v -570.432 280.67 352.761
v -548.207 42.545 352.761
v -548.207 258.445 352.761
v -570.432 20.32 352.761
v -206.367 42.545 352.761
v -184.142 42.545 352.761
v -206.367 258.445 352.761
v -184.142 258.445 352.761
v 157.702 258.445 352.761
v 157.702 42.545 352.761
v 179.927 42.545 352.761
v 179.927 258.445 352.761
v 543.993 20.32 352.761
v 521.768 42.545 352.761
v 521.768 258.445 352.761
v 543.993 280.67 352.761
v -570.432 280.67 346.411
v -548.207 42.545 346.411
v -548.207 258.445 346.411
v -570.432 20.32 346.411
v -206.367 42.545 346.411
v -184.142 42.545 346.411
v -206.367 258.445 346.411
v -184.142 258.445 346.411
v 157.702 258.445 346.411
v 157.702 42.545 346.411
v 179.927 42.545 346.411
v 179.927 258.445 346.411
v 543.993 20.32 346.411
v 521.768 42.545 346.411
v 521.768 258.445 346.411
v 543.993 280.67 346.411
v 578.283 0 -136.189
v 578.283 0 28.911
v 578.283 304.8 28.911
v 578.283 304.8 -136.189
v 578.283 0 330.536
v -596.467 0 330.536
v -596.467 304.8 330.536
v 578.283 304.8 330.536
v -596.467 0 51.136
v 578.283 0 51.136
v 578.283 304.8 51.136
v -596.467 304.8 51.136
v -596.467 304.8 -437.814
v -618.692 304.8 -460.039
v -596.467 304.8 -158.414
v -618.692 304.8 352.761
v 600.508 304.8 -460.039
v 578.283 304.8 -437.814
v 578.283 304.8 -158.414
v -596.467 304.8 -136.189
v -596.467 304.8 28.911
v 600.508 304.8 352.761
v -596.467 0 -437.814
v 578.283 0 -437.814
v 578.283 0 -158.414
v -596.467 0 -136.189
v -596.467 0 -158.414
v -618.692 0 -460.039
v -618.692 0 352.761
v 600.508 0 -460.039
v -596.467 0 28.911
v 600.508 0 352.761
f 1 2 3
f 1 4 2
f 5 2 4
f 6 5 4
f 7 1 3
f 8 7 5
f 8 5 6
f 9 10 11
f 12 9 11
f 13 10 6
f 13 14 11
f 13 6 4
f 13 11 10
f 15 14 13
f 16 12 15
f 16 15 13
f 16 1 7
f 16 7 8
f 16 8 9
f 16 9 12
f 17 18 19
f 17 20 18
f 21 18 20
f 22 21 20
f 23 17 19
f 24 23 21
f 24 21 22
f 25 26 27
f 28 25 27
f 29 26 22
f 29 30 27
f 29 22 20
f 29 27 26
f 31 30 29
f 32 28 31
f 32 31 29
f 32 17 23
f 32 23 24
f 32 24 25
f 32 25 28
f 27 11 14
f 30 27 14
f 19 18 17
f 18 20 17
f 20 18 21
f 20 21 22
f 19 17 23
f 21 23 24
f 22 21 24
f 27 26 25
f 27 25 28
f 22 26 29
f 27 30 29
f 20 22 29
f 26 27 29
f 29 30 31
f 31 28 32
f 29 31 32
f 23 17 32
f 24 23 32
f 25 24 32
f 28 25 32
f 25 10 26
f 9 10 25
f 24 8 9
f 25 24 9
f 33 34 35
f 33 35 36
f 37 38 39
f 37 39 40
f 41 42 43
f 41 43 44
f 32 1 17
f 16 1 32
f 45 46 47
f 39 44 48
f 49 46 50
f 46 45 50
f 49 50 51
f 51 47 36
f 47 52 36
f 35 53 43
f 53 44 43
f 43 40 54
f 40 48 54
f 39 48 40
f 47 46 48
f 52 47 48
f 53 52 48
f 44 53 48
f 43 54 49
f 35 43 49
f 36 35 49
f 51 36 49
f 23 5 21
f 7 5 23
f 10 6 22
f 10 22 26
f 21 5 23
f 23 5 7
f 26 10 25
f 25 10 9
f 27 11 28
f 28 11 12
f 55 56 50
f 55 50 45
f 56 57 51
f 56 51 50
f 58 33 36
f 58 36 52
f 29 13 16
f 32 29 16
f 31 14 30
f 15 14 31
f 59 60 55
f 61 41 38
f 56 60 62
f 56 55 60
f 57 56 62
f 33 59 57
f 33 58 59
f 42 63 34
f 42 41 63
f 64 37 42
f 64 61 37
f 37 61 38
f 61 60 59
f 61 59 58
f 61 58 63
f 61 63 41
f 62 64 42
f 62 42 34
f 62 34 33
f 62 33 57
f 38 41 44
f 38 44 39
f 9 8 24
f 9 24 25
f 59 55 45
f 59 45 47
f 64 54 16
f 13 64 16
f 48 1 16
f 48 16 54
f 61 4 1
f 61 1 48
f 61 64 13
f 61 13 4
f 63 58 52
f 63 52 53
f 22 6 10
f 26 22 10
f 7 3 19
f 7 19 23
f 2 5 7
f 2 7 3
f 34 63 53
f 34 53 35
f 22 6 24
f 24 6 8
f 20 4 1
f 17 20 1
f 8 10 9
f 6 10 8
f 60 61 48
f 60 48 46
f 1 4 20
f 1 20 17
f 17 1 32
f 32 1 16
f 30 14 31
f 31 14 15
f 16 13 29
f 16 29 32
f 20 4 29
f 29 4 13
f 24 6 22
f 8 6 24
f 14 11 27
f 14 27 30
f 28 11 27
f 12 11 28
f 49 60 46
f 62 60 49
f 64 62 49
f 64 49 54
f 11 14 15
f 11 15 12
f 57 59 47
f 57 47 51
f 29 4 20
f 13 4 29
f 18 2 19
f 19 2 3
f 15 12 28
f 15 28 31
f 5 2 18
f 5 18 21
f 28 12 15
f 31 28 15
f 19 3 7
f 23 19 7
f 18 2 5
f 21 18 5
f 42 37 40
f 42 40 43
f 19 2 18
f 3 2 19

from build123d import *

# Parameters (mm, degrees)
F1_DEPTH = 304.8
F2_W     = 1114.425
F2_H     = 260.35
F2_W_2   = 341.84082
F2_H_2   = 215.9
F2_W_3   = 341.84336
F3_DEPTH = 6.35
F4_DEPTH = 6.35


with BuildPart() as f1:
    # F0 (on Front) → F1 (new body)
    with BuildSketch(Plane.XZ):
        Polygon((578.282658, 330.536146), (600.507658, 330.536146), (600.507658, 352.761146), (578.282658, 352.761146), (-558.367342, 352.761146), (-596.467342, 352.761146), (-618.692342, 352.761146), (-618.692342, 330.536146), (-596.467342, 330.536146), (-558.367342, 330.536146), align=None)
        Polygon((-618.692342, -437.813854), (-596.467342, -437.813854), (-596.467342, -158.413854), (-596.467342, -136.188854), (-596.467342, 28.911146), (-596.467342, 51.136146), (-596.467342, 330.536146), (-618.692342, 330.536146), align=None)
        Polygon((578.282658, -437.813854), (600.507658, -437.813854), (600.507658, 330.536146), (578.282658, 330.536146), (578.282658, 51.136146), (578.282658, 28.911146), (578.282658, -136.188854), (578.282658, -158.413854), align=None)
        Polygon((578.282658, 28.911146), (578.282658, 51.136146), (540.182658, 51.136146), (-596.467342, 51.136146), (-596.467342, 28.911146), (540.182658, 28.911146), align=None)
        Polygon((-558.367342, -158.413854), (578.282658, -158.413854), (578.282658, -136.188854), (-558.367342, -136.188854), (-596.467342, -136.188854), (-596.467342, -158.413854), align=None)
        Polygon((600.507658, -460.038854), (600.507658, -437.813854), (578.282658, -437.813854), (-596.467342, -437.813854), (-618.692342, -437.813854), (-618.692342, -460.038854), align=None)
    extrude(amount=-F1_DEPTH)

    # F2 (on face) → F3 (cut)
    with BuildSketch(Plane.XY.offset(352.761146)):
        with Locations((-13.219984, 150.495006)):
            Rectangle(F2_W, F2_H)
        with Locations((-377.287074, 150.495006)):
            Rectangle(F2_W_2, F2_H_2, mode=Mode.SUBTRACT)
        with Locations((-13.219984, 150.495006)):
            Rectangle(F2_W_3, F2_H_2, mode=Mode.SUBTRACT)
        with Locations((350.847106, 150.495006)):
            Rectangle(F2_W_2, F2_H_2, mode=Mode.SUBTRACT)
    extrude(amount=-F3_DEPTH, mode=Mode.SUBTRACT)


with BuildPart() as f4:
    # F2 (on face) → F4 (new body)
    with BuildSketch(Plane.XY.offset(352.761146)):
        with Locations((-13.219984, 150.495006)):
            Rectangle(F2_W, F2_H)
        with Locations((-377.287074, 150.495006)):
            Rectangle(F2_W_2, F2_H_2, mode=Mode.SUBTRACT)
        with Locations((-13.219984, 150.495006)):
            Rectangle(F2_W_3, F2_H_2, mode=Mode.SUBTRACT)
        with Locations((350.847106, 150.495006)):
            Rectangle(F2_W_2, F2_H_2, mode=Mode.SUBTRACT)
    extrude(amount=-F4_DEPTH)


solid = Compound([f1.part, f4.part])
